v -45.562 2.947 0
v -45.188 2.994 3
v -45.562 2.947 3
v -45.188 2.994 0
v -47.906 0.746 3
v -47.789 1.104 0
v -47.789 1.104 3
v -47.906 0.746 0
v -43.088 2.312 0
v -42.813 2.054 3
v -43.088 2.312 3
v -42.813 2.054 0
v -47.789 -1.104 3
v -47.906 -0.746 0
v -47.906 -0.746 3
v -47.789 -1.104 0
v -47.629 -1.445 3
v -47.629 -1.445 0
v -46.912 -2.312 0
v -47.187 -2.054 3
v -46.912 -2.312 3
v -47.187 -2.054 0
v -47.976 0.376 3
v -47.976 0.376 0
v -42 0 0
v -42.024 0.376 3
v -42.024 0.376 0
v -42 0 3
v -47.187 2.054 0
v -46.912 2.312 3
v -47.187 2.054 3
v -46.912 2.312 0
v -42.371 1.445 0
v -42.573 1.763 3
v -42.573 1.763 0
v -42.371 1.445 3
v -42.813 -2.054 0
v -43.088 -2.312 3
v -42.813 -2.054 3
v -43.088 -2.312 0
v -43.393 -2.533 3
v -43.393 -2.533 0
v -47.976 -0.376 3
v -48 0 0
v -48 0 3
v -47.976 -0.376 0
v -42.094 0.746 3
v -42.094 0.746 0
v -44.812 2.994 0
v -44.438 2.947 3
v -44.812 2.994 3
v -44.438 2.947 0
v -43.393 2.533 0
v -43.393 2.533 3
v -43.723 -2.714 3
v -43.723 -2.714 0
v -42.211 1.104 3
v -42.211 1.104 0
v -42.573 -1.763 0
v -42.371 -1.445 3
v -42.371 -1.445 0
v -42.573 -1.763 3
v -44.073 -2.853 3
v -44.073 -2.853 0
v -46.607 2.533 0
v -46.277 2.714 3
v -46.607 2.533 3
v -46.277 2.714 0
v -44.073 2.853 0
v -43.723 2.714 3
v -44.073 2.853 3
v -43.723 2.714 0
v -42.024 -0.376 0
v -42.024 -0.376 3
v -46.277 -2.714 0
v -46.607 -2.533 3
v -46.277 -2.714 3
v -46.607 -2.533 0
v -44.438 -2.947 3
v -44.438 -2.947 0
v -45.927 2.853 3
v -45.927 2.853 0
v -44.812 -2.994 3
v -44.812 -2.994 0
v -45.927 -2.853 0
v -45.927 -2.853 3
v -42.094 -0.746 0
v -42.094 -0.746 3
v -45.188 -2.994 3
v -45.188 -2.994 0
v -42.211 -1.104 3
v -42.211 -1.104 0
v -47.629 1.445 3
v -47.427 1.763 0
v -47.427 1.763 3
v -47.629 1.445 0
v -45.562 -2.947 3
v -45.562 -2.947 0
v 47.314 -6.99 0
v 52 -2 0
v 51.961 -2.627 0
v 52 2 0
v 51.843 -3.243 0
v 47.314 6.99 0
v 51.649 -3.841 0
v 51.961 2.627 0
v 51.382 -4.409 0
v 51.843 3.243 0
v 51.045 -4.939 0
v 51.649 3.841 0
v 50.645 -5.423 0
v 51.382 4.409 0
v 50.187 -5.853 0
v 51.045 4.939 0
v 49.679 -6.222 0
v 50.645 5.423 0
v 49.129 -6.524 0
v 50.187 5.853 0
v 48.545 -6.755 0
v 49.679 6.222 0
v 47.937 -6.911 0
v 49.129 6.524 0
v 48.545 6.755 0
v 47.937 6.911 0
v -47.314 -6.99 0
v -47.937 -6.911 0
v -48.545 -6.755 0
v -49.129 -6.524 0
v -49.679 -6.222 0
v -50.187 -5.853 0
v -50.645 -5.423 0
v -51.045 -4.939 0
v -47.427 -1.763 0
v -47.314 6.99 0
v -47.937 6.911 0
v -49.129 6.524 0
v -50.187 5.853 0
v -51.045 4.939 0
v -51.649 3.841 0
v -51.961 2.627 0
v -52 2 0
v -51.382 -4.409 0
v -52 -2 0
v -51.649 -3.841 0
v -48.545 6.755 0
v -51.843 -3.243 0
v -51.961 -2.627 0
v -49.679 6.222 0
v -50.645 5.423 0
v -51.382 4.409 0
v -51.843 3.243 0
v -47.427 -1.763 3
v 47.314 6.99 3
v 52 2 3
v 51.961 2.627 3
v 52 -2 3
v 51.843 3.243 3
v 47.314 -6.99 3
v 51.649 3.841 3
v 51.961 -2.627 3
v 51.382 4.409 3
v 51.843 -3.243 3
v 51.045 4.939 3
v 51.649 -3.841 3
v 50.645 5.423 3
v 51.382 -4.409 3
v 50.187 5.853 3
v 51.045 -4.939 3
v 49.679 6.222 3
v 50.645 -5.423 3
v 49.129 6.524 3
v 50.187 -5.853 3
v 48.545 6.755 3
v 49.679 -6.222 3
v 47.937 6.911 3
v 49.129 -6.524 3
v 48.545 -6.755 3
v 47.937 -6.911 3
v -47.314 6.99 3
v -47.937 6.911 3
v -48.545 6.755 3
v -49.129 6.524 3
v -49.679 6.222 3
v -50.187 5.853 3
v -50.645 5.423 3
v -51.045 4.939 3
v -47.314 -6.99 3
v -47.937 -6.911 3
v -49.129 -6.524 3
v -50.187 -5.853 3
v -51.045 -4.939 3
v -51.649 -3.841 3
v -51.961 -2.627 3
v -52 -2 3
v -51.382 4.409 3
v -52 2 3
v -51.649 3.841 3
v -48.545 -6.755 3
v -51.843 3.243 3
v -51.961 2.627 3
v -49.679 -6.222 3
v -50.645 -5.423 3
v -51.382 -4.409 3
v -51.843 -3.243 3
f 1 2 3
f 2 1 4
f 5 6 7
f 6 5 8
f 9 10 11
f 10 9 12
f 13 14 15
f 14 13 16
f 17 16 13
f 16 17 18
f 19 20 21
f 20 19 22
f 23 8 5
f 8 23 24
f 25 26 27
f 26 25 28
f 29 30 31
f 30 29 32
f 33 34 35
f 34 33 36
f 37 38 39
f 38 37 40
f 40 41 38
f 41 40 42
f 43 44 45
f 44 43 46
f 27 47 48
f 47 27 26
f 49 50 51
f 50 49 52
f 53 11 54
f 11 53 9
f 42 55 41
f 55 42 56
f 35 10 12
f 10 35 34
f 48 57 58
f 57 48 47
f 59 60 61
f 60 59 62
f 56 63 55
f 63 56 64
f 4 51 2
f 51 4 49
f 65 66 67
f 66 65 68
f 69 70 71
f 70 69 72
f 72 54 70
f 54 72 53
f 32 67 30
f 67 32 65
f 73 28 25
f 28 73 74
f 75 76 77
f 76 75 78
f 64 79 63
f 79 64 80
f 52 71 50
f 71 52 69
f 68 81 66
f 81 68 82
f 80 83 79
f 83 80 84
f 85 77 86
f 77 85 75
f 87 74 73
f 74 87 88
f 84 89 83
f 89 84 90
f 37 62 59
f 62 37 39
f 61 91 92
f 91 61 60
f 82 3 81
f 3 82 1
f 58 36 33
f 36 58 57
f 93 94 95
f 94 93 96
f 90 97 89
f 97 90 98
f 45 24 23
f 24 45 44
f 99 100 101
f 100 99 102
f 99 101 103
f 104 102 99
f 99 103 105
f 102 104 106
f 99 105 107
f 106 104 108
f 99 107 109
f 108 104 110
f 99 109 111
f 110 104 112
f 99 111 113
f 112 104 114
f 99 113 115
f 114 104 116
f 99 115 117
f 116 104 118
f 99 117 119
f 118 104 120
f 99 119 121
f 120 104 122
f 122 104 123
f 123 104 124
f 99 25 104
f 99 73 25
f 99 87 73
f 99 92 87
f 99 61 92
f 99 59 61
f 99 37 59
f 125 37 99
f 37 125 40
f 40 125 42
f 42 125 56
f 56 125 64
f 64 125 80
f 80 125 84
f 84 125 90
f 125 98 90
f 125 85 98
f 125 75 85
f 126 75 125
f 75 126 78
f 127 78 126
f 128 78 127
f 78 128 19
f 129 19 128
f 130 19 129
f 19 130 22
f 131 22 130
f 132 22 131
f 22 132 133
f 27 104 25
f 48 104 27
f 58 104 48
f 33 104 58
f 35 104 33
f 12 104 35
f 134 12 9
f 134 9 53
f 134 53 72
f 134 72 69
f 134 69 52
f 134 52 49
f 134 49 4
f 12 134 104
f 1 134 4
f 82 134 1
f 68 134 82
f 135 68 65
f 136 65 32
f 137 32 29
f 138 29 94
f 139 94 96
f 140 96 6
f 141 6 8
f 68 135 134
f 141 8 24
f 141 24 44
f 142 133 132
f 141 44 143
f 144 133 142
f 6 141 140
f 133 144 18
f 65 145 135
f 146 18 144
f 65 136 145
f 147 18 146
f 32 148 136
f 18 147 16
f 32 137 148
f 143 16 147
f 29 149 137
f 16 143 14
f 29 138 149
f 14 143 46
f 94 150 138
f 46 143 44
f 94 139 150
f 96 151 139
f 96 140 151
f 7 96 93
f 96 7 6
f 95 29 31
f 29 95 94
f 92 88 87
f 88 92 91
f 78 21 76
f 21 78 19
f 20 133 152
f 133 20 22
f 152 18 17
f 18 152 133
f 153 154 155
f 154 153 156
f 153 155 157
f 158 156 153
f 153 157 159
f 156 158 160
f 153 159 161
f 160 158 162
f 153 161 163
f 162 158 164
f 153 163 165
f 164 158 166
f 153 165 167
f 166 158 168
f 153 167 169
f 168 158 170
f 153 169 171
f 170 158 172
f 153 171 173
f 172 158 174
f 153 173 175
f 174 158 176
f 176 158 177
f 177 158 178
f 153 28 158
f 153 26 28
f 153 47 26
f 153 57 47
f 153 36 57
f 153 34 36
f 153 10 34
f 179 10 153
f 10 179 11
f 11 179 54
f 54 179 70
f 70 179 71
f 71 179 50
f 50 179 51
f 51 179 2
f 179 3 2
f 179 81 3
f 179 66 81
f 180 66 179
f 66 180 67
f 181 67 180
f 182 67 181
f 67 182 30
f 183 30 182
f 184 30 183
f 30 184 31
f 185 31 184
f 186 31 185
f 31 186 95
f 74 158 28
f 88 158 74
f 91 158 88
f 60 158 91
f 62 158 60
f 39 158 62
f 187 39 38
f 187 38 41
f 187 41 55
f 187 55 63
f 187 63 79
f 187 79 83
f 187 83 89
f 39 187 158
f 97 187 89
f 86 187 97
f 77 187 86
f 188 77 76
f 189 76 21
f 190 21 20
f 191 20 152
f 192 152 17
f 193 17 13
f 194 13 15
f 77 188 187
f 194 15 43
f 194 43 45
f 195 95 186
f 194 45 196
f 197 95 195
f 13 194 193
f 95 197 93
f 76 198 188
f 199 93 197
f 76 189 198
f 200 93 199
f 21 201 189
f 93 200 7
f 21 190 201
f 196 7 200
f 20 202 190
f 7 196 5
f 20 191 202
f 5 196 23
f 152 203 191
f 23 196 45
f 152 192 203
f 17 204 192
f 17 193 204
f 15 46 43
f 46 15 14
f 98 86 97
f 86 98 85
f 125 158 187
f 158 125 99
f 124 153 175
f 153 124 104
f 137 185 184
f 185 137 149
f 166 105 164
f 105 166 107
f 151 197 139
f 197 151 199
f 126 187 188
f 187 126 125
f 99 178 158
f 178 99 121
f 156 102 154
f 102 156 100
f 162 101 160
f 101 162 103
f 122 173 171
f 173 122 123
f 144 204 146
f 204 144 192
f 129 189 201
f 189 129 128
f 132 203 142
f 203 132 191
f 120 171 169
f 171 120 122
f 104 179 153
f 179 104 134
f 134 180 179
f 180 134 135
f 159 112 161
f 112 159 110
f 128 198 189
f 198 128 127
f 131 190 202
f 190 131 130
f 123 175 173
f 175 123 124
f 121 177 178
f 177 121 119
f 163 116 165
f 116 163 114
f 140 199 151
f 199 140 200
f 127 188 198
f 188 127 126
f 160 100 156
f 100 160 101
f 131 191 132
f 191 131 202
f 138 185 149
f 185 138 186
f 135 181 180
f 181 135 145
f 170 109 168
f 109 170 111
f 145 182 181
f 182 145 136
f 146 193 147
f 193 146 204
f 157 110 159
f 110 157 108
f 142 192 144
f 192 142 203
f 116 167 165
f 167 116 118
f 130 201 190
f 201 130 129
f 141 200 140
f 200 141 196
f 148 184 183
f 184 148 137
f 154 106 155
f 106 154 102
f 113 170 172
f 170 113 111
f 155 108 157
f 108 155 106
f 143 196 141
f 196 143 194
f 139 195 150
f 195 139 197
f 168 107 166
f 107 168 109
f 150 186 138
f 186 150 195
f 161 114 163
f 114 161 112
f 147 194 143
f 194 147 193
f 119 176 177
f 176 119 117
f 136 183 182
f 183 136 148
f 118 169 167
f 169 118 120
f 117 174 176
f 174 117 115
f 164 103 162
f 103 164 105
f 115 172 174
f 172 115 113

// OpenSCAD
$fn = 50;


difference() {
	union() {
		hull() {
			translate(v = [-47.0000000000, 2.0000000000, 0]) {
				cylinder(h = 3, r = 5);
			}
			translate(v = [47.0000000000, 2.0000000000, 0]) {
				cylinder(h = 3, r = 5);
			}
			translate(v = [-47.0000000000, -2.0000000000, 0]) {
				cylinder(h = 3, r = 5);
			}
			translate(v = [47.0000000000, -2.0000000000, 0]) {
				cylinder(h = 3, r = 5);
			}
		}
	}
	union() {
		translate(v = [-45.0000000000, 0.0000000000, 0]) {
			cylinder(h = 3, r = 3.0000000000);
		}
		translate(v = [-45.0000000000, 0.0000000000, 0]) {
			cylinder(h = 3, r = 1.5000000000);
		}
		translate(v = [-45.0000000000, 0.0000000000, 0]) {
			cylinder(h = 3, r = 1.5000000000);
		}
		translate(v = [-45.0000000000, 0.0000000000, 0]) {
			cylinder(h = 3, r = 1.5000000000);
		}
	}
}
